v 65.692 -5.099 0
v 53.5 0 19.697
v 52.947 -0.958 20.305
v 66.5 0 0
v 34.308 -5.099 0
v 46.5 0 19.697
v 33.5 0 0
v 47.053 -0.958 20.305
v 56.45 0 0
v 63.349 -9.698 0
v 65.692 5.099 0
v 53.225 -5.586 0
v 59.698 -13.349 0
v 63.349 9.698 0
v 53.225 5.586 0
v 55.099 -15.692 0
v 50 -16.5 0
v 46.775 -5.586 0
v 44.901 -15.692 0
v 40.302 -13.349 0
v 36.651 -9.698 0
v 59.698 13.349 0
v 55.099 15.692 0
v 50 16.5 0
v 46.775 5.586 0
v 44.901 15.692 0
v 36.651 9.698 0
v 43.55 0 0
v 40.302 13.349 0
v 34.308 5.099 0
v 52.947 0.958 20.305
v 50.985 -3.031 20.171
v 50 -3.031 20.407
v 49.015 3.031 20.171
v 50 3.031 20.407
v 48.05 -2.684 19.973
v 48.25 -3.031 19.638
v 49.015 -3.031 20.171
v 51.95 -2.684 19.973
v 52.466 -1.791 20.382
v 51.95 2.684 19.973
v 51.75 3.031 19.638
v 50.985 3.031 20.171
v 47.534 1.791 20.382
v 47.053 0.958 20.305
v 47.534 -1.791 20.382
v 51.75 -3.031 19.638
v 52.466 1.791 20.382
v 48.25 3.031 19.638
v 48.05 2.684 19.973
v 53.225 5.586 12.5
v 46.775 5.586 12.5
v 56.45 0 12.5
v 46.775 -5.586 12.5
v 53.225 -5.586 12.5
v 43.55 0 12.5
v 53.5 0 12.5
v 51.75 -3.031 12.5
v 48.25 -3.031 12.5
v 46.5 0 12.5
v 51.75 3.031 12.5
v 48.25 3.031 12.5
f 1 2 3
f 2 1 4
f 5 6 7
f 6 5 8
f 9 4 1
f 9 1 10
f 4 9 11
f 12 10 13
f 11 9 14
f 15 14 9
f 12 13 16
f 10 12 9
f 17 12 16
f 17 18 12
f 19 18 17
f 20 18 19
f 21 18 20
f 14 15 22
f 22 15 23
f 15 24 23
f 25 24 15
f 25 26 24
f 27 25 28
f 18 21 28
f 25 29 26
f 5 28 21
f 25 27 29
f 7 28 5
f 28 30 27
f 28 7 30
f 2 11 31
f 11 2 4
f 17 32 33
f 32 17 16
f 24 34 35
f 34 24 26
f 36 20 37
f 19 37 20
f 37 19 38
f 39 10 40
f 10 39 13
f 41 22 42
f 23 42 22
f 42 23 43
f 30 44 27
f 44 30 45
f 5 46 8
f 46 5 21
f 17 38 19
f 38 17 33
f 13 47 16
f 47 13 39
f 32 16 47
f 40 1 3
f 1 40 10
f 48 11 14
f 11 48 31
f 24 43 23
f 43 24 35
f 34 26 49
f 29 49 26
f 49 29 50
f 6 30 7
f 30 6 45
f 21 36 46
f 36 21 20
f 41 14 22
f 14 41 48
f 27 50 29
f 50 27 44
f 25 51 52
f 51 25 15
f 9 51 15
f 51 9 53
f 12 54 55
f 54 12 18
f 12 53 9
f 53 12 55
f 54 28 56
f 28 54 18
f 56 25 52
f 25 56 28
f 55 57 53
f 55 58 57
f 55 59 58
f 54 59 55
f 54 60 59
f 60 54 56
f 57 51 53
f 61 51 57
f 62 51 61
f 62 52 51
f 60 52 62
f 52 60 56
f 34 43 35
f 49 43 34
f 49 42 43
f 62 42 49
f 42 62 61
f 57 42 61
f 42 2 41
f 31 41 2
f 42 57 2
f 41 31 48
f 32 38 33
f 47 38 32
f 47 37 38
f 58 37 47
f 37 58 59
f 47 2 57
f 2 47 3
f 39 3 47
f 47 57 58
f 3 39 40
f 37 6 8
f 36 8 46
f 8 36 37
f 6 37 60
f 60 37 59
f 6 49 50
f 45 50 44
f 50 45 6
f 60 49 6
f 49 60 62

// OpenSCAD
r_base=16.5; //base cone radius
h_base=25; //height base cone
r_nut=5.7; //nut inside cone
h_nut=5; //thickness nut
r_dish=16.5; //radius superior dish
h_dish=3; //thickness
r1_handle=4; //radius superior handle
r2_handle=2;
h_handle=30;

// inferior part
module cone(){
  difference() {
      cylinder(r1=0,r2=r_base, h=h_base, $fn=20,center=false);
      translate ([0,0,h_base/2]) cylinder(r=r_nut+0.75, h=h_base/2, $fn=6, center=false);
      cylinder(r=3.5, h=100, $fn=6,center=false); //hole for pencil
  }
}
// superior part
module sup_part() {
difference(){
  union(){
      translate([0, 0, 0]) rotate([0, 0, 0]) cylinder(r=r_nut, h=h_base/2-h_nut-1, $fn=6, center=false); //inferior nut
      translate([0, 0, h_base/2-h_nut-1]) cylinder(r=7.2, h=1, $fn=20, center=false); //CD hole
      translate([0, 0, h_base/2-h_nut-1+0.8]) cylinder(r=r_dish, h=h_dish, center=false); //middle ring
      //  translate([0, 0, h_base/2-h_nut-1+0.8+h_dish]) cylinder(r1=r1_handle, r2=r2_handle, h=h_handle, center=false); //superior handle
      }
  cylinder(r=3.5, h=100, $fn=6,center=false); //hole for pencil
  }
}

//translate([50, 0, h_base/2]) rotate ([180,0,0]) cone();
//sup_part();

translate([50, 0, h_base]) rotate ([180,0,0]) cone();
